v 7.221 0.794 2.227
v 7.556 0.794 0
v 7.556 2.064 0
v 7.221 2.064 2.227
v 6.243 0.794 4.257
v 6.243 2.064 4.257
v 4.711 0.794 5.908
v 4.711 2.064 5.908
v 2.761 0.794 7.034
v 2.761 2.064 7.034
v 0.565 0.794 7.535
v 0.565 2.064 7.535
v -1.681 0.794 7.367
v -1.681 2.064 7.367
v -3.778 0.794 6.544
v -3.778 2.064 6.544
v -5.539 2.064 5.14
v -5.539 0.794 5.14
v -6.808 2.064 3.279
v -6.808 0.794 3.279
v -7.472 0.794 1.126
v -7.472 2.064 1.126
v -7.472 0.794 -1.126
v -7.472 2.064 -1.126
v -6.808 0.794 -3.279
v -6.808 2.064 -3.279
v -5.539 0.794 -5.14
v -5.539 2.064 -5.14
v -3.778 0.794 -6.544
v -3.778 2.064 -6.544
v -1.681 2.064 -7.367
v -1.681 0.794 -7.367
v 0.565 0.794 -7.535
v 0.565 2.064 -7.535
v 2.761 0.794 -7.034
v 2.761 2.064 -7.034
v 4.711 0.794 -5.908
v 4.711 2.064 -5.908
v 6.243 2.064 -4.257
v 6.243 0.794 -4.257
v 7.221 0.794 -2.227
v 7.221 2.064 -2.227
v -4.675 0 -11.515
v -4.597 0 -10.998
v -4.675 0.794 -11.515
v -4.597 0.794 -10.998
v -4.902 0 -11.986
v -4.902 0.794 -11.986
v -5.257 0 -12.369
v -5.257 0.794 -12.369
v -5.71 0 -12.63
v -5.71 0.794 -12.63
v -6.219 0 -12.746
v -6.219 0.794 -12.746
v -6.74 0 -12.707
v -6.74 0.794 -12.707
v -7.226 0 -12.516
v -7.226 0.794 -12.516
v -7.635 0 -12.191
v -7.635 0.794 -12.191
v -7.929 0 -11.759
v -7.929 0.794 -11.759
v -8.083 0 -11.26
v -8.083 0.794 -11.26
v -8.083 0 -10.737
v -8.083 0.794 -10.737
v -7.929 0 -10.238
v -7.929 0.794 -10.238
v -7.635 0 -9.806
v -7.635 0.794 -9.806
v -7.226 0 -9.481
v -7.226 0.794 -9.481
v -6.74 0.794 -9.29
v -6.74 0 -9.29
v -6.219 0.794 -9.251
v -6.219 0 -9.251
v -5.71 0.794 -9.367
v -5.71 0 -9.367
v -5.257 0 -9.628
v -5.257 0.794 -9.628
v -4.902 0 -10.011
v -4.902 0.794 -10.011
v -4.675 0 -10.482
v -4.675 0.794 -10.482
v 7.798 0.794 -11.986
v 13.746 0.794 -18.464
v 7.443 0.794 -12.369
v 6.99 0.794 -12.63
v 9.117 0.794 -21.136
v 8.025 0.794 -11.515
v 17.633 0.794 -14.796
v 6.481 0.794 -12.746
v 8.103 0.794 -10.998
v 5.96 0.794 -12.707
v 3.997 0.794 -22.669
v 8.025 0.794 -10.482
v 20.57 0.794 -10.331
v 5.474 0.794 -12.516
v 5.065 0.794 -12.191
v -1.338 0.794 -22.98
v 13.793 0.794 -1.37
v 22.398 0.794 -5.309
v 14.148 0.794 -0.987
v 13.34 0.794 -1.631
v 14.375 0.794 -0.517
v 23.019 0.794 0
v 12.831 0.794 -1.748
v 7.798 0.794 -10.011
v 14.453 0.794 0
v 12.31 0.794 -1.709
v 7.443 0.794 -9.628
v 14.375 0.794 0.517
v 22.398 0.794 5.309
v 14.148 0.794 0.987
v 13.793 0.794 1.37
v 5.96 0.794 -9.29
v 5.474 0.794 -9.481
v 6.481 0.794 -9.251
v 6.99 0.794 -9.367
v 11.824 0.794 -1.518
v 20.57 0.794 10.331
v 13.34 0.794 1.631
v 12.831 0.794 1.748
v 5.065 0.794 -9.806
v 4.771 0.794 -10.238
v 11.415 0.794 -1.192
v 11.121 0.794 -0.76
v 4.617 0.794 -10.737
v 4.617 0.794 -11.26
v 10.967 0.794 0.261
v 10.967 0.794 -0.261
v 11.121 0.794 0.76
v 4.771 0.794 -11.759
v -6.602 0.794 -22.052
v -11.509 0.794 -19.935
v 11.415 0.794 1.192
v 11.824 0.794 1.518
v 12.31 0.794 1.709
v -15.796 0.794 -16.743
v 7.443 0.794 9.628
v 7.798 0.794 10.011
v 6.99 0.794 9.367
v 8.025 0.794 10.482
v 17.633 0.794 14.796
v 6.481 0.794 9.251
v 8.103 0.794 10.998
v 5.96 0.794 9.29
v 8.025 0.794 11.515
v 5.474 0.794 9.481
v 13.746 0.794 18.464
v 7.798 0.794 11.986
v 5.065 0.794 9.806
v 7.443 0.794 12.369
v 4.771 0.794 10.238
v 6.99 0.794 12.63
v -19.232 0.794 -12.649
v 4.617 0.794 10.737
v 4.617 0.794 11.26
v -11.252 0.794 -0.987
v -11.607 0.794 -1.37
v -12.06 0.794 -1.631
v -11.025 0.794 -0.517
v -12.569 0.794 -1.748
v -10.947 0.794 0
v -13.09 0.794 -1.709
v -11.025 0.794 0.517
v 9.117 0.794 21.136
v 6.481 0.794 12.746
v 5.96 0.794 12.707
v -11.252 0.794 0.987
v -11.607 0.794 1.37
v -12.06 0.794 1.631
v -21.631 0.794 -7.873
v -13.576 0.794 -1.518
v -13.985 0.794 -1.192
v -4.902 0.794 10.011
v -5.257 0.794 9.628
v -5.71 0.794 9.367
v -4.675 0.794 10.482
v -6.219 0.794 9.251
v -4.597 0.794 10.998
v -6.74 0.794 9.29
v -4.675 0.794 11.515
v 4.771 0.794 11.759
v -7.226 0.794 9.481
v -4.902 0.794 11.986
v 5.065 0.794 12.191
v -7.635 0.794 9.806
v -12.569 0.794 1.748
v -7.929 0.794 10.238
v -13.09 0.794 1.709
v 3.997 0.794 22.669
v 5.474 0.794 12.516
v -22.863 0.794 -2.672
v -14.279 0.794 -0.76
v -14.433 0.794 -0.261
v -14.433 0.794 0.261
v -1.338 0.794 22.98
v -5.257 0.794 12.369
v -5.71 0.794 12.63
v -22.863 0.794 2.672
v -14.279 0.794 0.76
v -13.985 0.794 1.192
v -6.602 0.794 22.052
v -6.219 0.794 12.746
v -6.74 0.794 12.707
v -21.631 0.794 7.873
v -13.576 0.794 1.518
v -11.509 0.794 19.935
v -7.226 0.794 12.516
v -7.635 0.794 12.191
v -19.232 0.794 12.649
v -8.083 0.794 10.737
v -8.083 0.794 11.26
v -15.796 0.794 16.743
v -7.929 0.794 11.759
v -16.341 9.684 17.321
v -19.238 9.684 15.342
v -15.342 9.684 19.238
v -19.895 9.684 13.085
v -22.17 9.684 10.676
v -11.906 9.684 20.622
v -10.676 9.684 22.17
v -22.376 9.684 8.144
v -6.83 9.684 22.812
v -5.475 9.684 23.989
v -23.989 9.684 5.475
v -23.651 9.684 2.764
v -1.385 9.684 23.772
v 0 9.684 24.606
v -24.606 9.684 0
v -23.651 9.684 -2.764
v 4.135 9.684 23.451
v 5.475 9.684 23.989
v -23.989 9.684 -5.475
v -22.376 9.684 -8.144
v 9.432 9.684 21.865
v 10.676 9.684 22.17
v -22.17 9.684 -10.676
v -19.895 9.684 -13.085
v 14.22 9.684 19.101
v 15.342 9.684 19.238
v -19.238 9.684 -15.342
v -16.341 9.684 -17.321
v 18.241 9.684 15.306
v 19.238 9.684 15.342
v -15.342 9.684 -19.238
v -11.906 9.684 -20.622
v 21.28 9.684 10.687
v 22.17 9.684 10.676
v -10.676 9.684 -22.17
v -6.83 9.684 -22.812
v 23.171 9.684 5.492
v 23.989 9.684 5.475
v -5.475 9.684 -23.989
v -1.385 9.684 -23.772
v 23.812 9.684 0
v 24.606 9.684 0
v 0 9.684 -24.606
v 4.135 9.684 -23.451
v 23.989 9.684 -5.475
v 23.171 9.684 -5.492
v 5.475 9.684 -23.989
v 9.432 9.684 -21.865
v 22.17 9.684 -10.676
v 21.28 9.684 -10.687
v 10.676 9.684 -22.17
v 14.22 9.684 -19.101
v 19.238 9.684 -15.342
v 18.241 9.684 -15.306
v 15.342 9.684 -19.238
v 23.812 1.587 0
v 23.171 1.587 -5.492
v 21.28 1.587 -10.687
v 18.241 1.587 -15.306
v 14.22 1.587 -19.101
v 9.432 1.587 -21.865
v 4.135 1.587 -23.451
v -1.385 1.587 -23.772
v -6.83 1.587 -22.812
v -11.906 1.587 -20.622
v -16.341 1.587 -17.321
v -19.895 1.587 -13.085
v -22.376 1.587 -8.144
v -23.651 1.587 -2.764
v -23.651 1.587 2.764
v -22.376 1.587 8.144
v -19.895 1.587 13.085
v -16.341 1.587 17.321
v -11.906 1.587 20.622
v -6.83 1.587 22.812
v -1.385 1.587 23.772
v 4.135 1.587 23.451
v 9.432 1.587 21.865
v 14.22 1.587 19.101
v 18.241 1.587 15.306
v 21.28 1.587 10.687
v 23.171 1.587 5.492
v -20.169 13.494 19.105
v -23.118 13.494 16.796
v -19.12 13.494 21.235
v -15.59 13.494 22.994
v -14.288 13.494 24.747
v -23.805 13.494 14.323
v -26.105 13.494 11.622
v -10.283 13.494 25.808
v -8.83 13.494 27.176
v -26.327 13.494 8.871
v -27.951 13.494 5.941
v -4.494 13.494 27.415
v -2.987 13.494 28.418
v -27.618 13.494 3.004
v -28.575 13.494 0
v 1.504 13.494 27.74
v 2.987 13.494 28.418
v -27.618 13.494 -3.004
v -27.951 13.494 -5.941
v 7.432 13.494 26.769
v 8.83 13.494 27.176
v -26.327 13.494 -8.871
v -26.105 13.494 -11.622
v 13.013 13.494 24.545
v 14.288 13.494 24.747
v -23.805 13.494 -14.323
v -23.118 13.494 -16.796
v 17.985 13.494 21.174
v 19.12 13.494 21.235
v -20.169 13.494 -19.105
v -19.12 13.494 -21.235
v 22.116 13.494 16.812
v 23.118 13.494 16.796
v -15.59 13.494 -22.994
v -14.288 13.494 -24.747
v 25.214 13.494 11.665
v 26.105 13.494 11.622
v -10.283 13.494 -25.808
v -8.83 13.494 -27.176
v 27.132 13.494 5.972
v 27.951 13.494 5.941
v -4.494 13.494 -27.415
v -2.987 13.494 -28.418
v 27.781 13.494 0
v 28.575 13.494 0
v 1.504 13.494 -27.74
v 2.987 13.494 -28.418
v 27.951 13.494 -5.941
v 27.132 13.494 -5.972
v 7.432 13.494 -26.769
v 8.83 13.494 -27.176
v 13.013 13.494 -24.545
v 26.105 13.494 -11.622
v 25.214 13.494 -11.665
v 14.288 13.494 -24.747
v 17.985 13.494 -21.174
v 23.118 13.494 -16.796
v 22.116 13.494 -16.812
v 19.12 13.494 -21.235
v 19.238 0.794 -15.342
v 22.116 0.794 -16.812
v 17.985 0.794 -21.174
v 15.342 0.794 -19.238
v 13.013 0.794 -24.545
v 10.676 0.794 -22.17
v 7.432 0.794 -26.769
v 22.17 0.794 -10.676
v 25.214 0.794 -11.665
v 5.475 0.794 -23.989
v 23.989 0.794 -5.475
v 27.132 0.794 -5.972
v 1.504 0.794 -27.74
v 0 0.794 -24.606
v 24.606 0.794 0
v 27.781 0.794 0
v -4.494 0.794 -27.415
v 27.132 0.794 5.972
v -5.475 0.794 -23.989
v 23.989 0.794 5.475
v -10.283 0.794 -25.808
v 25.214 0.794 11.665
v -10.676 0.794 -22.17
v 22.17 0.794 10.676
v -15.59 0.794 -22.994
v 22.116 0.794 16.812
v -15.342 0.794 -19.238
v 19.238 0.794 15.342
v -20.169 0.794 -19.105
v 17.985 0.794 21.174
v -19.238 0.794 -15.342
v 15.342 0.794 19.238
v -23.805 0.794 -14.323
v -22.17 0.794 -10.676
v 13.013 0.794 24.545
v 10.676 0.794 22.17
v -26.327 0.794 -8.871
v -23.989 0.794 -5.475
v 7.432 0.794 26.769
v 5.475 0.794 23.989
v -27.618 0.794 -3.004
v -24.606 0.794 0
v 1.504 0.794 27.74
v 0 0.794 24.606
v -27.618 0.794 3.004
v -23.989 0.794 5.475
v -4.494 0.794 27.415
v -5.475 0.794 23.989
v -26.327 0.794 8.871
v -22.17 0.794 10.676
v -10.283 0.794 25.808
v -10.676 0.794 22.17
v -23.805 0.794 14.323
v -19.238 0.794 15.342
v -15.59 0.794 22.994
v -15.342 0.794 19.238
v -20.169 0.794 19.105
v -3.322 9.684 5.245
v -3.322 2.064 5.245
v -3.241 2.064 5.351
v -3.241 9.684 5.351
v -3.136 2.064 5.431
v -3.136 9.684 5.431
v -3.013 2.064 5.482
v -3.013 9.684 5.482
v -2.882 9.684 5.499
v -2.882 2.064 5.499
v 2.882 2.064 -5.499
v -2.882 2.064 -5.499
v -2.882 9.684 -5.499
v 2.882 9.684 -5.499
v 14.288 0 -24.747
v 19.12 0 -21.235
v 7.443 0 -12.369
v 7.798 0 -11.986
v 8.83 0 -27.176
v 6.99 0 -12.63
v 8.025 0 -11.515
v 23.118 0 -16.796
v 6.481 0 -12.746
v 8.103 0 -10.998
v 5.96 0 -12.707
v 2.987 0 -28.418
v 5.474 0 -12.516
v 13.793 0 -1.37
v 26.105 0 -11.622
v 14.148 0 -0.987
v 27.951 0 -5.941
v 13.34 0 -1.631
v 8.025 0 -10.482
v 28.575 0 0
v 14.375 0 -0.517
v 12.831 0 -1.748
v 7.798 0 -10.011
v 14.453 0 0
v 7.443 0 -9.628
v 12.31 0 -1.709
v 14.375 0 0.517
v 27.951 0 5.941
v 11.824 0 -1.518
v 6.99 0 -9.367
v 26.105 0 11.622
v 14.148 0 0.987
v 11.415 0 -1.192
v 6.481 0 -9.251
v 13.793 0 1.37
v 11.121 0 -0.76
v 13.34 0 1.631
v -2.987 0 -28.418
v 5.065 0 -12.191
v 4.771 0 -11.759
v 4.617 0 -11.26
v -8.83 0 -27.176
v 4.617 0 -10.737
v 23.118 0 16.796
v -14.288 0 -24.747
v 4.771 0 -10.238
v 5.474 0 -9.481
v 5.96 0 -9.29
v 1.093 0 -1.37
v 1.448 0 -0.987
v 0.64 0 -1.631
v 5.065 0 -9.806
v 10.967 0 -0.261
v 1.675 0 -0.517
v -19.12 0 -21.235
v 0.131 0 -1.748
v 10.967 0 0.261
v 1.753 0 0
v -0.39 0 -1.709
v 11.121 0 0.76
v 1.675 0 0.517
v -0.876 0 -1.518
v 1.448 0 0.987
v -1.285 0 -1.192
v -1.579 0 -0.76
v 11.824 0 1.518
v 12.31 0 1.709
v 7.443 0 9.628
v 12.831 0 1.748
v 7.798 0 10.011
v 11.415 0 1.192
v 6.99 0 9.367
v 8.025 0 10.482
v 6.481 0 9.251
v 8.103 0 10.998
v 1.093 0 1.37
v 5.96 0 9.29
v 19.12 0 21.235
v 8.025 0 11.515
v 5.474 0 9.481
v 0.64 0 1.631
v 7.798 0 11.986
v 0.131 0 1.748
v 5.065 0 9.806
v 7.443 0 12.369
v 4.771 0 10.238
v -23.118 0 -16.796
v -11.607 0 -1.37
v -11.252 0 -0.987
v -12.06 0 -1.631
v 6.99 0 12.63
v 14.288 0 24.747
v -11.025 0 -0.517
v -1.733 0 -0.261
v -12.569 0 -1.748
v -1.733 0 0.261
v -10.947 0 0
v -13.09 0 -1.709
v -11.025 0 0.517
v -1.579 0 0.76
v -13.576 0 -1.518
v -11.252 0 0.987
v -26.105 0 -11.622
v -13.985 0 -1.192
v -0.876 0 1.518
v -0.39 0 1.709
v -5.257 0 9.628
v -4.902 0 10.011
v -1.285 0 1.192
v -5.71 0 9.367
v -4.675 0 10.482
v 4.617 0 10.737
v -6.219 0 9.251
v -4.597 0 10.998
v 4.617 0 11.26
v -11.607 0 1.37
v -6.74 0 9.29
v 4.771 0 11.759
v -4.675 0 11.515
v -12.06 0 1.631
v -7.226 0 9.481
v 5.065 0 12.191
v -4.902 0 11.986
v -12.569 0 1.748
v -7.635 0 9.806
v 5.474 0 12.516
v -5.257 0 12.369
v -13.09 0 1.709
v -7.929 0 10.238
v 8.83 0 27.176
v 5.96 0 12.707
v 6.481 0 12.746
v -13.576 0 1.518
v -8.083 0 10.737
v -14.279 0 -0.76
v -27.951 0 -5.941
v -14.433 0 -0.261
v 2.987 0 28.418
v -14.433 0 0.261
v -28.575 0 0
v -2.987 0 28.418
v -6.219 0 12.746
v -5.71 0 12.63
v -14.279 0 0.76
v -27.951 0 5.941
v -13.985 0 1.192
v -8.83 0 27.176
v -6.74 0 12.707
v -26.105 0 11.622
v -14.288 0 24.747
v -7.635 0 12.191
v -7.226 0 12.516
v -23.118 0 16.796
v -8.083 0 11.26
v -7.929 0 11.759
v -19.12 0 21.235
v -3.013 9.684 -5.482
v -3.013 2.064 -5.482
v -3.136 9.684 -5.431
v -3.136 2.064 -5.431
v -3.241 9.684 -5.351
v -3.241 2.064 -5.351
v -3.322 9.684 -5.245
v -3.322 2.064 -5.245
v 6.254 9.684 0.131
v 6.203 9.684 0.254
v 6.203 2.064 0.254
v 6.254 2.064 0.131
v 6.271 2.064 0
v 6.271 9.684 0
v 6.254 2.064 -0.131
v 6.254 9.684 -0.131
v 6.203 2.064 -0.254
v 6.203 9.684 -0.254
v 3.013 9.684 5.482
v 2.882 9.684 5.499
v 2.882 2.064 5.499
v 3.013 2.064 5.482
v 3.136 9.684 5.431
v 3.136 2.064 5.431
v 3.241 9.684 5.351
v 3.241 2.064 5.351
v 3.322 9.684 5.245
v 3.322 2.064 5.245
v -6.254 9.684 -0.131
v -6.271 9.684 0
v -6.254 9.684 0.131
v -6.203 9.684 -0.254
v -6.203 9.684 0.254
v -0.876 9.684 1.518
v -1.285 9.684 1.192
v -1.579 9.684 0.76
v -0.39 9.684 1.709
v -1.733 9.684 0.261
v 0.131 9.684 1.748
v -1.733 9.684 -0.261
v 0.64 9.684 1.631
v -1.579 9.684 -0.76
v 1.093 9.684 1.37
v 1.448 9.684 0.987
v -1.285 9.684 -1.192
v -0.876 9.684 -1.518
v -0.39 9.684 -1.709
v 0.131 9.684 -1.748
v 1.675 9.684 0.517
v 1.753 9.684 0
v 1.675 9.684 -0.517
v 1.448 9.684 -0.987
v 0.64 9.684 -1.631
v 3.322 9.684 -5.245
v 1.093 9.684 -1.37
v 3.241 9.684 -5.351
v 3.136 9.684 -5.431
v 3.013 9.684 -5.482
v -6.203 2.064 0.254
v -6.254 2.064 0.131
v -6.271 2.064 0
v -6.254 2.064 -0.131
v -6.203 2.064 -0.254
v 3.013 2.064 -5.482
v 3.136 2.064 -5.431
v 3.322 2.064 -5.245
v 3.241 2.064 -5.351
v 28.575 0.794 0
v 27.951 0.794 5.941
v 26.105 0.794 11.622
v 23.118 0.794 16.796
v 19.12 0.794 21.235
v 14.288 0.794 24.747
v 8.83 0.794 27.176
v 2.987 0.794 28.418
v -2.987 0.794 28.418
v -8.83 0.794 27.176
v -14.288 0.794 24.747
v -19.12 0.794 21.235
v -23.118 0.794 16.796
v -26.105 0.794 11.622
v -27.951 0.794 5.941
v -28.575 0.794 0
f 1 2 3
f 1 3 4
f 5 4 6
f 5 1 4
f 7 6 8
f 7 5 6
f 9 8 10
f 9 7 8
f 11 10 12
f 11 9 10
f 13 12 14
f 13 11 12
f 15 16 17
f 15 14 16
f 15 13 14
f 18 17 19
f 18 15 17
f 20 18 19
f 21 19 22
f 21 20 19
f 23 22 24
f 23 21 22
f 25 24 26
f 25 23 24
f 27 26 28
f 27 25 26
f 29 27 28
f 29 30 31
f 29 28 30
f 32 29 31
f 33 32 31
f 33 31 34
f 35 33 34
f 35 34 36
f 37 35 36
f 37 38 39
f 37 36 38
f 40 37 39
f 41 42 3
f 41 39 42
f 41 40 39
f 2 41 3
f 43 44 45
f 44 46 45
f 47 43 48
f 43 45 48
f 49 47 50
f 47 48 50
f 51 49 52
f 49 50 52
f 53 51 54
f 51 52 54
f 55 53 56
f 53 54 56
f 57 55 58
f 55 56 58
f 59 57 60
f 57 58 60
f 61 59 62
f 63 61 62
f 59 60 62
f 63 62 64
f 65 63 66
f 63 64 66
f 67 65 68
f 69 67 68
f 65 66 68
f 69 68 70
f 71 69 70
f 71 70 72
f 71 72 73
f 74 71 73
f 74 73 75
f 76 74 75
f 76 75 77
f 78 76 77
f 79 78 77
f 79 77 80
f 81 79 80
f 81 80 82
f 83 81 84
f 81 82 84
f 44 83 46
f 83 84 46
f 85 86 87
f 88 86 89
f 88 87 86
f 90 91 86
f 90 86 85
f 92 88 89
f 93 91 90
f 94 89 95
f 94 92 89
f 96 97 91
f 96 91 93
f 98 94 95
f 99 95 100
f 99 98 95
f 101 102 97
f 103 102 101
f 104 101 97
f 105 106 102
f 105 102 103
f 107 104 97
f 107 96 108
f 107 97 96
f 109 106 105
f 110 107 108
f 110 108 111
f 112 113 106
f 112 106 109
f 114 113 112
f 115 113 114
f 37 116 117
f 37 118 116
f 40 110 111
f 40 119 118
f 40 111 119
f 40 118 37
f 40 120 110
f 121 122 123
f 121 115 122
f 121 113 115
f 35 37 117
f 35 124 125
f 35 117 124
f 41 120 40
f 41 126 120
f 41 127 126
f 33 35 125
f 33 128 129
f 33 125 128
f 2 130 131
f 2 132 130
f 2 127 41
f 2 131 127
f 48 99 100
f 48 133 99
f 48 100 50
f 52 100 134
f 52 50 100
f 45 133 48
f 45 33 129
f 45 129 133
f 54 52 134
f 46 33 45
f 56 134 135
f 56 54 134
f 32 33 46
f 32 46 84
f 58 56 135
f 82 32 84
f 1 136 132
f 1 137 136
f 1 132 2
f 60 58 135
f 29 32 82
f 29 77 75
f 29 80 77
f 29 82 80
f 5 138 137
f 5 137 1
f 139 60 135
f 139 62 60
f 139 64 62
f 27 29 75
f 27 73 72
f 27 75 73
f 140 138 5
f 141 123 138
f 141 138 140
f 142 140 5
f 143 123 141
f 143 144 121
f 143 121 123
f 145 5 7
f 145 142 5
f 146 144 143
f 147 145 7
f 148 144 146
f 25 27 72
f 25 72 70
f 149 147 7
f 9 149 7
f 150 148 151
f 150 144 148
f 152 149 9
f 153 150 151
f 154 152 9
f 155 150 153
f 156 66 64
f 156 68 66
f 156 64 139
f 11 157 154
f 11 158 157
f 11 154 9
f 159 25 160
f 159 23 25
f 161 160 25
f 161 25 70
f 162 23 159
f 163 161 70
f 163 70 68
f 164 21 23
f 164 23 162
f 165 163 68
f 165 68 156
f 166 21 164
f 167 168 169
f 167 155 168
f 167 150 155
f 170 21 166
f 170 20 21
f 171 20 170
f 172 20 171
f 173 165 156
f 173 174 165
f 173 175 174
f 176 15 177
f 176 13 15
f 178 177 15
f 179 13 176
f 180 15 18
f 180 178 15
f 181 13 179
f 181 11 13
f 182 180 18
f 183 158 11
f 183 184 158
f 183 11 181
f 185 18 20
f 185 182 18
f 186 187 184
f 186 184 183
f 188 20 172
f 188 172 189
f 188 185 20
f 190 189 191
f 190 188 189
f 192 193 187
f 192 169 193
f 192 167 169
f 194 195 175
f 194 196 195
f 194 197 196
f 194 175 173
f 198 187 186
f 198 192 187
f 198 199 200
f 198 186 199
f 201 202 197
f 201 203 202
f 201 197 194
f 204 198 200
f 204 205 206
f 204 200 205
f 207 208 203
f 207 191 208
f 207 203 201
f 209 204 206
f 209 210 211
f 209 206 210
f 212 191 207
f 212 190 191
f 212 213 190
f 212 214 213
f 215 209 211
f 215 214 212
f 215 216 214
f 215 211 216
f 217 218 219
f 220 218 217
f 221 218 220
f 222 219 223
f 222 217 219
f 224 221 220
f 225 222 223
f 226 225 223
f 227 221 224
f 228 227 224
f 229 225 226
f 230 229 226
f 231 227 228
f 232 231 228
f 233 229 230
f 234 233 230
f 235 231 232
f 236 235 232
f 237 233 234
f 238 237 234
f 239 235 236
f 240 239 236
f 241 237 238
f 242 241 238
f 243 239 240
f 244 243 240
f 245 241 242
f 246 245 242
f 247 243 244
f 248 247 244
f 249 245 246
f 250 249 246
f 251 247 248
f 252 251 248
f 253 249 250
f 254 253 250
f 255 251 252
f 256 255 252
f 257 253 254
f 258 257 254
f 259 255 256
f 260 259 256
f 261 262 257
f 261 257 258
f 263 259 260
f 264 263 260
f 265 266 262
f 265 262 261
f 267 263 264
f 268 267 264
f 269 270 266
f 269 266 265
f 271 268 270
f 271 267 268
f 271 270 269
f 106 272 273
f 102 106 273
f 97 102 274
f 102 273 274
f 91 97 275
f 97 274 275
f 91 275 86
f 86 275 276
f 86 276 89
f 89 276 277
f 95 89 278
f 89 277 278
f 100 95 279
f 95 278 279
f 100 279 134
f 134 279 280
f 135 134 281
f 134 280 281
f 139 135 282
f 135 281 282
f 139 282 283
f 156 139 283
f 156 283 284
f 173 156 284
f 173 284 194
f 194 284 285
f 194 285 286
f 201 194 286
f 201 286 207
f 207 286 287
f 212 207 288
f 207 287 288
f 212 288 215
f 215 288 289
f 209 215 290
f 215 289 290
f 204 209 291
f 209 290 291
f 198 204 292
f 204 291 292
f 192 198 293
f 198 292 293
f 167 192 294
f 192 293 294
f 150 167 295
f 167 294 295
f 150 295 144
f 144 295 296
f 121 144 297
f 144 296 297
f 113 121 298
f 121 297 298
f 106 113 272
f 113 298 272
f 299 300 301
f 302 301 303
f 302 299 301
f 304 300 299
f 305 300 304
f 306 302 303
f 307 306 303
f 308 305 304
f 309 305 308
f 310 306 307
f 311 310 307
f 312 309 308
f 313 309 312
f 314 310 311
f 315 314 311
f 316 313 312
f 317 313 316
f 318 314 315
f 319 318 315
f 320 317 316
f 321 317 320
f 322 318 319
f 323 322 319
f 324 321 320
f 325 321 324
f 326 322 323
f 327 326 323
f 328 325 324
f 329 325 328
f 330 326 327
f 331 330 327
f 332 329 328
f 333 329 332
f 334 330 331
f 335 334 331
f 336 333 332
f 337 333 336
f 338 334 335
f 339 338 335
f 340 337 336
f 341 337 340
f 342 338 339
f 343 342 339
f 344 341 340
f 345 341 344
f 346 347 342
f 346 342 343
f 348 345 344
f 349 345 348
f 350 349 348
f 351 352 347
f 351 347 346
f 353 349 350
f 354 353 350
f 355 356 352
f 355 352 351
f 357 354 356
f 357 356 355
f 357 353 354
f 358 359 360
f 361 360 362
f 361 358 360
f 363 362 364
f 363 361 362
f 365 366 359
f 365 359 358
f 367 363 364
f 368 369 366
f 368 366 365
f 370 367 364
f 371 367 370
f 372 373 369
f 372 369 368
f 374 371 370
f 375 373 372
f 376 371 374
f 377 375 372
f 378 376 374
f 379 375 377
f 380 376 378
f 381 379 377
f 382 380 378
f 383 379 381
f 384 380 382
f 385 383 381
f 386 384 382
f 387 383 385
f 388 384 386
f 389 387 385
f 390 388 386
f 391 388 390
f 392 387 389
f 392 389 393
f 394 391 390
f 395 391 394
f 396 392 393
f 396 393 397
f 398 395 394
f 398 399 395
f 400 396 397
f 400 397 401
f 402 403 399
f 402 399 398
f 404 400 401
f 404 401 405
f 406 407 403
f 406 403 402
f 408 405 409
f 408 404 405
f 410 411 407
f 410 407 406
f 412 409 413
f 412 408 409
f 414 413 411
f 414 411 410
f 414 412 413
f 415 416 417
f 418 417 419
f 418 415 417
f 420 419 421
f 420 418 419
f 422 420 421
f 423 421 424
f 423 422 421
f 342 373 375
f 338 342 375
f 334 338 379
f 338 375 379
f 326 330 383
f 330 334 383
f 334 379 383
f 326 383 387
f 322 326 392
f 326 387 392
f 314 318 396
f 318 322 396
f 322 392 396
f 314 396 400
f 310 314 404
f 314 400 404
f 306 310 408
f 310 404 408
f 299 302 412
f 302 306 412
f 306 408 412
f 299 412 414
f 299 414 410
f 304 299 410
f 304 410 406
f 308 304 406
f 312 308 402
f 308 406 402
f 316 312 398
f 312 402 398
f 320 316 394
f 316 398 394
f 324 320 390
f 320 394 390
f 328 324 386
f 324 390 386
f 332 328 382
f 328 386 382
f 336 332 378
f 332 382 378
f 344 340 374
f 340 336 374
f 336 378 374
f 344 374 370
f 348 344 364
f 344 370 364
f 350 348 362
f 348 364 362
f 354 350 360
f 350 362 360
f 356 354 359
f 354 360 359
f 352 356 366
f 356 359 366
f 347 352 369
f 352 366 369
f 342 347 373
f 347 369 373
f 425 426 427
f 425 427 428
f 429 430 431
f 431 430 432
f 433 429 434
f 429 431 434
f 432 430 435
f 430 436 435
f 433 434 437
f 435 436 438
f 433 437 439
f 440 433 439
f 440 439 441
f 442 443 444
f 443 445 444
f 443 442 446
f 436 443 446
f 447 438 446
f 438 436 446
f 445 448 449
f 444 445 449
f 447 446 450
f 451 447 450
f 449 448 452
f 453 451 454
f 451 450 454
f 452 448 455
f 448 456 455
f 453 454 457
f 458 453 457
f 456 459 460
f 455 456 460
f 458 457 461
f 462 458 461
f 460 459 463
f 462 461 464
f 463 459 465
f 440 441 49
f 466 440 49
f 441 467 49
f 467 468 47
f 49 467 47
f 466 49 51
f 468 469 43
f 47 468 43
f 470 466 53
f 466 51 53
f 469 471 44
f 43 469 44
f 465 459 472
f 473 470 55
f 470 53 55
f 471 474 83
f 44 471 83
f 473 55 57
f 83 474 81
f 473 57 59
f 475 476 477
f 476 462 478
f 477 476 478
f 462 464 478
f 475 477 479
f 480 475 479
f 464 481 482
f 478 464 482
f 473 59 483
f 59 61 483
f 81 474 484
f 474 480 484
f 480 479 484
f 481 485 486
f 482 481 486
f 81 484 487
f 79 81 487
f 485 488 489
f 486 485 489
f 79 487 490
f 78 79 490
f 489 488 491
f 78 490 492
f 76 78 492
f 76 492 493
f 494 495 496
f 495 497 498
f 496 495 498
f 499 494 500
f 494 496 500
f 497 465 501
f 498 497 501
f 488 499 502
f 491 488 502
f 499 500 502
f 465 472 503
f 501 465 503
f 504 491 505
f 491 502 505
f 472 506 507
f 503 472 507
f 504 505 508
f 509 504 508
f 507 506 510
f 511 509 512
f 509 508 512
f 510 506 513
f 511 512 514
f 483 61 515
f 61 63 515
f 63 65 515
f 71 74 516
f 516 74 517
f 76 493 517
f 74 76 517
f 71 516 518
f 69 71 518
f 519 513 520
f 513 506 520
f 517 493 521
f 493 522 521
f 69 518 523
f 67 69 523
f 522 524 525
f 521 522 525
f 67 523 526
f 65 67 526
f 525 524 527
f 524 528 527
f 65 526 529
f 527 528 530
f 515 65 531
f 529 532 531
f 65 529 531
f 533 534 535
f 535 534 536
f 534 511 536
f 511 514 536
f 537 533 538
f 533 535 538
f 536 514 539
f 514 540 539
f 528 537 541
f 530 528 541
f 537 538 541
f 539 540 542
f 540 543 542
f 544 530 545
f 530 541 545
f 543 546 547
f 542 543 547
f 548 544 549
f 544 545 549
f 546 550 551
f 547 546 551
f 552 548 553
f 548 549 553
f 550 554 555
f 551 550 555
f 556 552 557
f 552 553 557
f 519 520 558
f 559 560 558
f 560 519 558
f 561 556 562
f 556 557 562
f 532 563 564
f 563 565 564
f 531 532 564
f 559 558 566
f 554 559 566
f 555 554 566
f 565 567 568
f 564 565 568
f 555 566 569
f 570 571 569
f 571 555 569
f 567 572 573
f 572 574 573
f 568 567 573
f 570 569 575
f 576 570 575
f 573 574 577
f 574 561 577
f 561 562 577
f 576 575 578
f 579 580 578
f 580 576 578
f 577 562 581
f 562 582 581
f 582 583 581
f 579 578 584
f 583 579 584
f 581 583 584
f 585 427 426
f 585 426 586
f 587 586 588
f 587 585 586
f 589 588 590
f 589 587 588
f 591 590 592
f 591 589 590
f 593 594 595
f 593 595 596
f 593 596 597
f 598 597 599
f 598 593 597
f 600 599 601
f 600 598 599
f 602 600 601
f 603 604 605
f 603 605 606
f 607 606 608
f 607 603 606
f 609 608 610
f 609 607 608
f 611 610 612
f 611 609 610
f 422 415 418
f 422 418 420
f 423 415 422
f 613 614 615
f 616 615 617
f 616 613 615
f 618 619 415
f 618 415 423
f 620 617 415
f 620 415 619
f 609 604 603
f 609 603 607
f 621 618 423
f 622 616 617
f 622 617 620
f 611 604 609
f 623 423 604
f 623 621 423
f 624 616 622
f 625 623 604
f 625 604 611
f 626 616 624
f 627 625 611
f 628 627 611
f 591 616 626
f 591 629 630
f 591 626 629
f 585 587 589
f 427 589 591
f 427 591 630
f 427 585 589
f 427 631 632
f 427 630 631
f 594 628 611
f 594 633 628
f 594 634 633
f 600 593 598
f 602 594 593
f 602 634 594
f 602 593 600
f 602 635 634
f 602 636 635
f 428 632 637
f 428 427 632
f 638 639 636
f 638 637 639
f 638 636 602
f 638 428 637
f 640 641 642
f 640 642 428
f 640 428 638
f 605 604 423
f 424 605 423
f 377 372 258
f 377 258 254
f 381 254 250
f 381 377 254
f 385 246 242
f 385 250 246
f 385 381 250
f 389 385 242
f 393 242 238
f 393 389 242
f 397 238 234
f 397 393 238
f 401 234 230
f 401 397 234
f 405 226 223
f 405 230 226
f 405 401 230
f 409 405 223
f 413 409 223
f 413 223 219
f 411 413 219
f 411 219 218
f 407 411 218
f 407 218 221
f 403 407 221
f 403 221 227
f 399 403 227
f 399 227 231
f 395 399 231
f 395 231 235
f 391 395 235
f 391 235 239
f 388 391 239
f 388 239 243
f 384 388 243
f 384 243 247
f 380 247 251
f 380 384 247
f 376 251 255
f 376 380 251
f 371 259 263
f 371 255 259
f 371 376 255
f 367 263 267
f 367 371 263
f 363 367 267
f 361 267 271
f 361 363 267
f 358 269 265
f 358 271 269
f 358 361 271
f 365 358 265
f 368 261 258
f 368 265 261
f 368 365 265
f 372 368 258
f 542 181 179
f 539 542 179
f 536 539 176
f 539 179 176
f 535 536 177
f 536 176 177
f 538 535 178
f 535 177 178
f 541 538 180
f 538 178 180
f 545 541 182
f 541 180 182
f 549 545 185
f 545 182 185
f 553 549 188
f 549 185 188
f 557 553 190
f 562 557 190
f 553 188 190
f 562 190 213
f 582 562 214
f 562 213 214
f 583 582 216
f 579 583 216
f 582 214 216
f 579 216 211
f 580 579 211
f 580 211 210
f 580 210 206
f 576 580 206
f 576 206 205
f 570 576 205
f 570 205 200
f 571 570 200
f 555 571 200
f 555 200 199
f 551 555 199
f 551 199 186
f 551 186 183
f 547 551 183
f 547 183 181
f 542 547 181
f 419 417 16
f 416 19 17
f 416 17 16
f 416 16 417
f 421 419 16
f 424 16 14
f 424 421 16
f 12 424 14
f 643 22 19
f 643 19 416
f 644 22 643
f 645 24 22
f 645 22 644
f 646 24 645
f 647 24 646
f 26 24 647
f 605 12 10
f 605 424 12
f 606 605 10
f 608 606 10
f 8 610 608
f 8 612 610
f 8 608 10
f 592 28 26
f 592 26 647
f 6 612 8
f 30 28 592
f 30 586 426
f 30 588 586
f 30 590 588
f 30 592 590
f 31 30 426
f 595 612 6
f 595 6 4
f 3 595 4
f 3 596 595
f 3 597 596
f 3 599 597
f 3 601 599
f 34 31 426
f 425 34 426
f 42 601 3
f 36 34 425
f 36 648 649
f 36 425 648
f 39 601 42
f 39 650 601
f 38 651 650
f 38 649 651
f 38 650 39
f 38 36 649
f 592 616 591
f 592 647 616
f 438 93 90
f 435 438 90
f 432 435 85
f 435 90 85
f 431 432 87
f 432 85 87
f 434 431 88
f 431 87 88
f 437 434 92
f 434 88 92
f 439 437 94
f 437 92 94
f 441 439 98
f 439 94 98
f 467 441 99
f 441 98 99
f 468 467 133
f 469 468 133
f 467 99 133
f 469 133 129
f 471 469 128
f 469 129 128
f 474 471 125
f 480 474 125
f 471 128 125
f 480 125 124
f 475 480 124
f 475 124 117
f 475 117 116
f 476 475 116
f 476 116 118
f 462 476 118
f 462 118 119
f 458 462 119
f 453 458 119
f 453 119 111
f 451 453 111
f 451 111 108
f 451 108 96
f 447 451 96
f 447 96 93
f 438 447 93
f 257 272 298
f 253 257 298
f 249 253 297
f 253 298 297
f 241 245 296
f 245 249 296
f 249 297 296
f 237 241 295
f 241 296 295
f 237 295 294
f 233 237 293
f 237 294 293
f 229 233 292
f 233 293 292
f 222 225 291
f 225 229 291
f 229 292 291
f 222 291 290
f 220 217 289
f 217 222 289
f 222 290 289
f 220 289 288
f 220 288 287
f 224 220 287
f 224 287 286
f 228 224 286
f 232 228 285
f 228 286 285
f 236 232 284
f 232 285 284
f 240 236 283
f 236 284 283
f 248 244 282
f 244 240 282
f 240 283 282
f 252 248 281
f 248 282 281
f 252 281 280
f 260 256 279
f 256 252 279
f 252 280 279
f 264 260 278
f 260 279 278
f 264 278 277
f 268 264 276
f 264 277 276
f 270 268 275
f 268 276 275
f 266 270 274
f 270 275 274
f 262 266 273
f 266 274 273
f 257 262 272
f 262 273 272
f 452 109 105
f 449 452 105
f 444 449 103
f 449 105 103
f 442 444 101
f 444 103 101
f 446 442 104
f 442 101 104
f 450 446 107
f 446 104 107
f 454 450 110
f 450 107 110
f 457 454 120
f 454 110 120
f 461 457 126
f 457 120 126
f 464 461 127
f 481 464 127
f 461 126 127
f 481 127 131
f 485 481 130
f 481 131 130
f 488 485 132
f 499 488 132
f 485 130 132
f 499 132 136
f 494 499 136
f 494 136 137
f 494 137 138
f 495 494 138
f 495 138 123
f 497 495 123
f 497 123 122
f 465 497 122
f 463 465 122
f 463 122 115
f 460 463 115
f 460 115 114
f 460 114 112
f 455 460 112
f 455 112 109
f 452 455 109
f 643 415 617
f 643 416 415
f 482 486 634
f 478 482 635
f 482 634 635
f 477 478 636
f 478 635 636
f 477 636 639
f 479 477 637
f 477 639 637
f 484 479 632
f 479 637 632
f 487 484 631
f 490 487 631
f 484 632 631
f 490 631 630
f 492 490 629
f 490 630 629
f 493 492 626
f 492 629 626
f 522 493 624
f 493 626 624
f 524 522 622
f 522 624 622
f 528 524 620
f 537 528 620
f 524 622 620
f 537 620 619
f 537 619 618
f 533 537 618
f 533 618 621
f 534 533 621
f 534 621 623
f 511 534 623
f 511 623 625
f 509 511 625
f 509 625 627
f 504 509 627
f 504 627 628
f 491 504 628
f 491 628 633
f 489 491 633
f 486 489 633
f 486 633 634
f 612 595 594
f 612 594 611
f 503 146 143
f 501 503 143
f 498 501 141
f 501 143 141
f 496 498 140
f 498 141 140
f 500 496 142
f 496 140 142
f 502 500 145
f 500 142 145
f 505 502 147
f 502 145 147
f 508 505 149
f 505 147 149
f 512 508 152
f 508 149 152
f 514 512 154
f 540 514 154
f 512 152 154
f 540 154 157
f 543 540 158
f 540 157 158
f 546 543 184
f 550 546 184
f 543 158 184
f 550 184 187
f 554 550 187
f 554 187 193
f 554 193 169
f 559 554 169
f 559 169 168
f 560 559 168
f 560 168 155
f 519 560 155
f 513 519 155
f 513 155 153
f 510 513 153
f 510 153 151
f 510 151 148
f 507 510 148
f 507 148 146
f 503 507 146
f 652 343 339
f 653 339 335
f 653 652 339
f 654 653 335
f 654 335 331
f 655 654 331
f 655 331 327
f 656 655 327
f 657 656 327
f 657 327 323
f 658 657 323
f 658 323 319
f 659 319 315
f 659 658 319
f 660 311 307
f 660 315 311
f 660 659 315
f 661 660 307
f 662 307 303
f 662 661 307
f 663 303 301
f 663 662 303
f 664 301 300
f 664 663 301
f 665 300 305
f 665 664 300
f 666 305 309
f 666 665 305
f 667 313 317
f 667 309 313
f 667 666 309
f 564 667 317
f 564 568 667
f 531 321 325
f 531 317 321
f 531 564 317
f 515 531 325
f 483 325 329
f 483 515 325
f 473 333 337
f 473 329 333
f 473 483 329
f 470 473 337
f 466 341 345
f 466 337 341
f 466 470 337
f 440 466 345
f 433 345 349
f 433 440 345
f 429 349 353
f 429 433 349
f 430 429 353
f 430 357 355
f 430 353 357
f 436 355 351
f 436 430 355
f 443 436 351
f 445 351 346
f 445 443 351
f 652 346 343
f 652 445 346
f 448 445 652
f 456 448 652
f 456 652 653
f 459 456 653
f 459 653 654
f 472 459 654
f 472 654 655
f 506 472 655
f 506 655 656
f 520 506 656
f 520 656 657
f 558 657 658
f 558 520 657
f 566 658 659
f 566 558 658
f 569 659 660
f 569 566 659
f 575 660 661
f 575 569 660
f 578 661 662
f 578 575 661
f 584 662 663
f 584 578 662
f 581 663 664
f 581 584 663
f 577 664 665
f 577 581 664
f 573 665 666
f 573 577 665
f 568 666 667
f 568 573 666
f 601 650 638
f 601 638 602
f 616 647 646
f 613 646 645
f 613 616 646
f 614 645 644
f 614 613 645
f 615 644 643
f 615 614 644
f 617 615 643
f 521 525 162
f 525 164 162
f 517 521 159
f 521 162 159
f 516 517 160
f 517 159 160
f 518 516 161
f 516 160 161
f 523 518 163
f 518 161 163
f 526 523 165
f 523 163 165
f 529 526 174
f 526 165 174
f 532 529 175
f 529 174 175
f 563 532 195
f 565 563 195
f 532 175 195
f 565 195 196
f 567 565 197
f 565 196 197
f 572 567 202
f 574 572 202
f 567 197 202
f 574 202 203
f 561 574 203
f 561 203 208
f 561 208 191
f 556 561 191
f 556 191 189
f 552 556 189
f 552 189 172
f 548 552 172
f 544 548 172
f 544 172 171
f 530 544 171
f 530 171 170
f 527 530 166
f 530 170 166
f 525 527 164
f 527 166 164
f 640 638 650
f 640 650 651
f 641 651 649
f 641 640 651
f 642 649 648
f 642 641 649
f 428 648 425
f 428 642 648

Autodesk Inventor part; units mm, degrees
ref_plane "YZ Plane" through (0, 0, 0) normal (1, 0, 0) x (0, 1, 0)
ref_plane "XZ Plane" through (0, 0, 0) normal (0, 1, 0) x (-1, 0, 0)
ref_plane "XY Plane" through (0, 0, 0) normal (0, 0, 1) x (1, 0, 0)
sketch "Sketch1" plane through (0, 0, 0) normal (0, 1, 0) x (-1, 0, 0)
  circle A0 centre (0, 0) radius 28.575
  dimension "d0" = 57.15
extrude "Extrusion1" add sketch "Sketch1" along normal blind 0.7937
sketch "Sketch2" plane through (0, 0.7937, 0) normal (0, 1, 0) x (1, 0, 0)
  line L0 (0, 0) -> (-28.575, 0) construction
  circle A0 centre (0, 0) radius 28.575 projected
  line L1 (-6.35, 0) -> (-3.175, 5.4993)
  line L2 (-3.175, 5.4993) -> (3.175, 5.4993)
  line L3 (3.175, 5.4993) -> (6.35, 0)
  line L4 (6.35, 0) -> (3.175, -5.4993)
  line L5 (3.175, -5.4993) -> (-3.175, -5.4993)
  line L6 (-3.175, -5.4993) -> (-6.35, 0)
  circle A1 centre (0, 0) radius 23.8125
  circle A2 centre (0, 0) radius 24.6063
  circle A3 centre (0, 0) radius 27.7812
  circle A4 centre (0, 0) radius 7.5565
  circle A5 centre (0, 0) radius 12.7 construction
  circle A6 centre (-12.7, 0) radius 1.7526
  circle A7 centre (-6.35, -10.9985) radius 1.7526
  circle A8 centre (6.35, -10.9985) radius 1.7526
  circle A9 centre (12.7, 0) radius 1.7526
  circle A10 centre (6.35, 10.9985) radius 1.7526
  circle A11 centre (-6.35, 10.9985) radius 1.7526
  dimension "d18" = 25.4
  dimension "d3" = 6.35
  dimension "d4" = 47.625
  dimension "d5" = 0.7937
  dimension "d6" = 0.7937
  dimension "d15" = 15.113
  dimension "d19" = 3.5052
  dimension "d22" = 360
extrude "Extrusion2" add sketch "Sketch2" along normal blind 8.89 contours L1 L2 L3 L4 L5 L6 | A2
fillet "Fillet1" radius 0.508 6 edges at (6.35, 5.2387, 0) (3.175, 5.2387, -5.4993) (-3.175, 5.2387, -5.4993) (-6.35, 5.2387, 0) (-3.175, 5.2387, 5.4993) (3.175, 5.2387, 5.4993)
extrude "Extrusion3" add sketch "Sketch2" along normal blind 12.7 contours A0
chamfer "Chamfer1" distance 0.7937 angle 45 1 edges at (-23.8125, 0.7937, 0)
extrude "Extrusion4" add sketch "Sketch2" along normal blind 1.27 contours L1 L2 L3 L4 L5 L6 | A4
extrude "Extrusion5" cut sketch "Sketch2" against normal through all contours A6 | A7 | A8 | A9 | A10 | A11
sketch "Sketch3" plane through (0, 9.6837, 0) normal (0, 1, 0) x (1, 0, 0)
  circle A0 centre (0, 0) radius 1.7526
  dimension "d26" = 3.5052
extrude "Extrusion6" cut sketch "Sketch3" against normal through all
properties part number "Wheel V2 Mold"
